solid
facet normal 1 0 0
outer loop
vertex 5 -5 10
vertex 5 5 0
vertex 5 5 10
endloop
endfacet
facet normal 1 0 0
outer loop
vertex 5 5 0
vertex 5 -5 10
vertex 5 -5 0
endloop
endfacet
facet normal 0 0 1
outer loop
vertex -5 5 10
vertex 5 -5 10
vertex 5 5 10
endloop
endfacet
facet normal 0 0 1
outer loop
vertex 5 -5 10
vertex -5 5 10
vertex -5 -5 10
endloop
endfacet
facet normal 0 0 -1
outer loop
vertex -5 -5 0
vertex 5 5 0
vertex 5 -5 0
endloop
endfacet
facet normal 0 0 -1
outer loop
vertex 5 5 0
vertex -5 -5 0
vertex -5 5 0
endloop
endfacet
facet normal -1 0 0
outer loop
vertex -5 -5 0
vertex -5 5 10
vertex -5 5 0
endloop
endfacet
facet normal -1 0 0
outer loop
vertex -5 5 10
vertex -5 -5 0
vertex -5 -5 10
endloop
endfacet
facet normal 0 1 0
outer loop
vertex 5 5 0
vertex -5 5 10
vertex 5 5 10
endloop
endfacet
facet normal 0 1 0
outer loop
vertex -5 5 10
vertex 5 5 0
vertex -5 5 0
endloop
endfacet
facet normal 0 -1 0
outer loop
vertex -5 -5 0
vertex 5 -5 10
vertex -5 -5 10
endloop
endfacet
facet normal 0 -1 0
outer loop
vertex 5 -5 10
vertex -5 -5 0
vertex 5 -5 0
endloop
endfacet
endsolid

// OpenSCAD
translate([0, 0, 5]) color([0,1,0,0.9]) cube([10, 10, 10], center=true);
translate([-1.25, -1.25, 1]) color([1,0,0]) cube([0.5, 0.5, 2], center=true);
translate([-1.25, -0.75, 1]) color([1,0,0]) cube([0.5, 0.5, 2], center=true);
translate([-1.25, -0.25, 1]) color([1,0,0]) cube([0.5, 0.5, 2], center=true);
translate([-1.25, 0.25, 1]) color([1,0,0]) cube([0.5, 0.5, 2], center=true);
translate([-1.25, 0.75, 1]) color([1,0,0]) cube([0.5, 0.5, 2], center=true);
translate([-1.25, 1.25, 1]) color([1,0,0]) cube([0.5, 0.5, 2], center=true);
translate([-0.75, -1.25, 1]) color([1,0,0]) cube([0.5, 0.5, 2], center=true);
translate([-0.75, -0.75, 1]) color([1,0,0]) cube([0.5, 0.5, 2], center=true);
translate([-0.75, -0.25, 1]) color([1,0,0]) cube([0.5, 0.5, 2], center=true);
translate([-0.75, 0.25, 1]) color([1,0,0]) cube([0.5, 0.5, 2], center=true);
translate([-0.75, 0.75, 1]) color([1,0,0]) cube([0.5, 0.5, 2], center=true);
translate([-0.75, 1.25, 1]) color([1,0,0]) cube([0.5, 0.5, 2], center=true);
translate([-0.25, -1.25, 1]) color([1,0,0]) cube([0.5, 0.5, 2], center=true);
translate([-0.25, -0.75, 1]) color([1,0,0]) cube([0.5, 0.5, 2], center=true);
translate([-0.25, -0.25, 1]) color([1,0,0]) cube([0.5, 0.5, 2], center=true);
translate([-0.25, 0.25, 1]) color([1,0,0]) cube([0.5, 0.5, 2], center=true);
translate([-0.25, 0.75, 1]) color([1,0,0]) cube([0.5, 0.5, 2], center=true);
translate([-0.25, 1.25, 1]) color([1,0,0]) cube([0.5, 0.5, 2], center=true);
translate([0.25, -1.25, 1]) color([1,0,0]) cube([0.5, 0.5, 2], center=true);
translate([0.25, -0.75, 1]) color([1,0,0]) cube([0.5, 0.5, 2], center=true);
translate([0.25, -0.25, 1]) color([1,0,0]) cube([0.5, 0.5, 2], center=true);
translate([0.25, 0.25, 1]) color([1,0,0]) cube([0.5, 0.5, 2], center=true);
translate([0.25, 0.75, 1]) color([1,0,0]) cube([0.5, 0.5, 2], center=true);
translate([0.25, 1.25, 1]) color([1,0,0]) cube([0.5, 0.5, 2], center=true);
translate([0.75, -1.25, 1]) color([1,0,0]) cube([0.5, 0.5, 2], center=true);
translate([0.75, -0.75, 1]) color([1,0,0]) cube([0.5, 0.5, 2], center=true);
translate([0.75, -0.25, 1]) color([1,0,0]) cube([0.5, 0.5, 2], center=true);
translate([0.75, 0.25, 1]) color([1,0,0]) cube([0.5, 0.5, 2], center=true);
translate([0.75, 0.75, 1]) color([1,0,0]) cube([0.5, 0.5, 2], center=true);
translate([0.75, 1.25, 1]) color([1,0,0]) cube([0.5, 0.5, 2], center=true);
translate([1.25, -1.25, 1]) color([1,0,0]) cube([0.5, 0.5, 2], center=true);
translate([1.25, -0.75, 1]) color([1,0,0]) cube([0.5, 0.5, 2], center=true);
translate([1.25, -0.25, 1]) color([1,0,0]) cube([0.5, 0.5, 2], center=true);
translate([1.25, 0.25, 1]) color([1,0,0]) cube([0.5, 0.5, 2], center=true);
translate([1.25, 0.75, 1]) color([1,0,0]) cube([0.5, 0.5, 2], center=true);
translate([1.25, 1.25, 1]) color([1,0,0]) cube([0.5, 0.5, 2], center=true);
translate([-1.25, -2.25, 1]) color([1,0,0]) cube([0.5, 0.5, 2], center=true);
translate([-1.25, -1.75, 1]) color([1,0,0]) cube([0.5, 0.5, 2], center=true);
translate([-1.25, -1.25, 1]) color([1,0,0]) cube([0.5, 0.5, 2], center=true);
translate([-1.25, -0.75, 1]) color([1,0,0]) cube([0.5, 0.5, 2], center=true);
translate([-1.25, -0.25, 1]) color([1,0,0]) cube([0.5, 0.5, 2], center=true);
translate([-1.25, 0.25, 1]) color([1,0,0]) cube([0.5, 0.5, 2], center=true);
translate([-1.25, 0.75, 1]) color([1,0,0]) cube([0.5, 0.5, 2], center=true);
translate([-1.25, 1.25, 1]) color([1,0,0]) cube([0.5, 0.5, 2], center=true);
translate([-1.25, 1.75, 1]) color([1,0,0]) cube([0.5, 0.5, 2], center=true);
translate([-1.25, 2.25, 1]) color([1,0,0]) cube([0.5, 0.5, 2], center=true);
translate([-0.75, -2.25, 1]) color([1,0,0]) cube([0.5, 0.5, 2], center=true);
translate([-0.75, -1.75, 1]) color([1,0,0]) cube([0.5, 0.5, 2], center=true);
translate([-0.75, -1.25, 1]) color([1,0,0]) cube([0.5, 0.5, 2], center=true);
translate([-0.75, -0.75, 1]) color([1,0,0]) cube([0.5, 0.5, 2], center=true);
translate([-0.75, -0.25, 1]) color([1,0,0]) cube([0.5, 0.5, 2], center=true);
translate([-0.75, 0.25, 1]) color([1,0,0]) cube([0.5, 0.5, 2], center=true);
translate([-0.75, 0.75, 1]) color([1,0,0]) cube([0.5, 0.5, 2], center=true);
translate([-0.75, 1.25, 1]) color([1,0,0]) cube([0.5, 0.5, 2], center=true);
translate([-0.75, 1.75, 1]) color([1,0,0]) cube([0.5, 0.5, 2], center=true);
translate([-0.75, 2.25, 1]) color([1,0,0]) cube([0.5, 0.5, 2], center=true);
translate([-0.25, -2.25, 1]) color([1,0,0]) cube([0.5, 0.5, 2], center=true);
translate([-0.25, -1.75, 1]) color([1,0,0]) cube([0.5, 0.5, 2], center=true);
translate([-0.25, -1.25, 1]) color([1,0,0]) cube([0.5, 0.5, 2], center=true);
translate([-0.25, -0.75, 1]) color([1,0,0]) cube([0.5, 0.5, 2], center=true);
translate([-0.25, -0.25, 1]) color([1,0,0]) cube([0.5, 0.5, 2], center=true);
translate([-0.25, 0.25, 1]) color([1,0,0]) cube([0.5, 0.5, 2], center=true);
translate([-0.25, 0.75, 1]) color([1,0,0]) cube([0.5, 0.5, 2], center=true);
translate([-0.25, 1.25, 1]) color([1,0,0]) cube([0.5, 0.5, 2], center=true);
translate([-0.25, 1.75, 1]) color([1,0,0]) cube([0.5, 0.5, 2], center=true);
translate([-0.25, 2.25, 1]) color([1,0,0]) cube([0.5, 0.5, 2], center=true);
translate([0.25, -2.25, 1]) color([1,0,0]) cube([0.5, 0.5, 2], center=true);
translate([0.25, -1.75, 1]) color([1,0,0]) cube([0.5, 0.5, 2], center=true);
translate([0.25, -1.25, 1]) color([1,0,0]) cube([0.5, 0.5, 2], center=true);
translate([0.25, -0.75, 1]) color([1,0,0]) cube([0.5, 0.5, 2], center=true);
translate([0.25, -0.25, 1]) color([1,0,0]) cube([0.5, 0.5, 2], center=true);
translate([0.25, 0.25, 1]) color([1,0,0]) cube([0.5, 0.5, 2], center=true);
translate([0.25, 0.75, 1]) color([1,0,0]) cube([0.5, 0.5, 2], center=true);
translate([0.25, 1.25, 1]) color([1,0,0]) cube([0.5, 0.5, 2], center=true);
translate([0.25, 1.75, 1]) color([1,0,0]) cube([0.5, 0.5, 2], center=true);
translate([0.25, 2.25, 1]) color([1,0,0]) cube([0.5, 0.5, 2], center=true);
translate([0.75, -2.25, 1]) color([1,0,0]) cube([0.5, 0.5, 2], center=true);
translate([0.75, -1.75, 1]) color([1,0,0]) cube([0.5, 0.5, 2], center=true);
translate([0.75, -1.25, 1]) color([1,0,0]) cube([0.5, 0.5, 2], center=true);
translate([0.75, -0.75, 1]) color([1,0,0]) cube([0.5, 0.5, 2], center=true);
translate([0.75, -0.25, 1]) color([1,0,0]) cube([0.5, 0.5, 2], center=true);
translate([0.75, 0.25, 1]) color([1,0,0]) cube([0.5, 0.5, 2], center=true);
translate([0.75, 0.75, 1]) color([1,0,0]) cube([0.5, 0.5, 2], center=true);
translate([0.75, 1.25, 1]) color([1,0,0]) cube([0.5, 0.5, 2], center=true);
translate([0.75, 1.75, 1]) color([1,0,0]) cube([0.5, 0.5, 2], center=true);
translate([0.75, 2.25, 1]) color([1,0,0]) cube([0.5, 0.5, 2], center=true);
translate([1.25, -2.25, 1]) color([1,0,0]) cube([0.5, 0.5, 2], center=true);
translate([1.25, -1.75, 1]) color([1,0,0]) cube([0.5, 0.5, 2], center=true);
translate([1.25, -1.25, 1]) color([1,0,0]) cube([0.5, 0.5, 2], center=true);
translate([1.25, -0.75, 1]) color([1,0,0]) cube([0.5, 0.5, 2], center=true);
translate([1.25, -0.25, 1]) color([1,0,0]) cube([0.5, 0.5, 2], center=true);
translate([1.25, 0.25, 1]) color([1,0,0]) cube([0.5, 0.5, 2], center=true);
translate([1.25, 0.75, 1]) color([1,0,0]) cube([0.5, 0.5, 2], center=true);
translate([1.25, 1.25, 1]) color([1,0,0]) cube([0.5, 0.5, 2], center=true);
translate([1.25, 1.75, 1]) color([1,0,0]) cube([0.5, 0.5, 2], center=true);
translate([1.25, 2.25, 1]) color([1,0,0]) cube([0.5, 0.5, 2], center=true);
translate([-2.25, -2.25, 1]) color([1,0,0]) cube([0.5, 0.5, 2], center=true);
translate([-2.25, -1.75, 1]) color([1,0,0]) cube([0.5, 0.5, 2], center=true);
translate([-2.25, -1.25, 1]) color([1,0,0]) cube([0.5, 0.5, 2], center=true);
translate([-2.25, -0.75, 1]) color([1,0,0]) cube([0.5, 0.5, 2], center=true);
translate([-2.25, -0.25, 1]) color([1,0,0]) cube([0.5, 0.5, 2], center=true);
translate([-2.25, 0.25, 1]) color([1,0,0]) cube([0.5, 0.5, 2], center=true);
translate([-2.25, 0.75, 1]) color([1,0,0]) cube([0.5, 0.5, 2], center=true);
translate([-2.25, 1.25, 1]) color([1,0,0]) cube([0.5, 0.5, 2], center=true);
translate([-2.25, 1.75, 1]) color([1,0,0]) cube([0.5, 0.5, 2], center=true);
translate([-2.25, 2.25, 1]) color([1,0,0]) cube([0.5, 0.5, 2], center=true);
translate([-1.75, -2.25, 1]) color([1,0,0]) cube([0.5, 0.5, 2], center=true);
translate([-1.75, -1.75, 1]) color([1,0,0]) cube([0.5, 0.5, 2], center=true);
translate([-1.75, -1.25, 1]) color([1,0,0]) cube([0.5, 0.5, 2], center=true);
translate([-1.75, -0.75, 1]) color([1,0,0]) cube([0.5, 0.5, 2], center=true);
translate([-1.75, -0.25, 1]) color([1,0,0]) cube([0.5, 0.5, 2], center=true);
translate([-1.75, 0.25, 1]) color([1,0,0]) cube([0.5, 0.5, 2], center=true);
translate([-1.75, 0.75, 1]) color([1,0,0]) cube([0.5, 0.5, 2], center=true);
translate([-1.75, 1.25, 1]) color([1,0,0]) cube([0.5, 0.5, 2], center=true);
translate([-1.75, 1.75, 1]) color([1,0,0]) cube([0.5, 0.5, 2], center=true);
translate([-1.75, 2.25, 1]) color([1,0,0]) cube([0.5, 0.5, 2], center=true);
translate([-2.25, -3.25, 1]) color([1,0,0]) cube([0.5, 0.5, 2], center=true);
translate([-2.25, -2.75, 1]) color([1,0,0]) cube([0.5, 0.5, 2], center=true);
translate([-2.25, -2.25, 1]) color([1,0,0]) cube([0.5, 0.5, 2], center=true);
translate([-2.25, -1.75, 1]) color([1,0,0]) cube([0.5, 0.5, 2], center=true);
translate([-2.25, -1.25, 1]) color([1,0,0]) cube([0.5, 0.5, 2], center=true);
translate([-2.25, -0.75, 1]) color([1,0,0]) cube([0.5, 0.5, 2], center=true);
translate([-2.25, -0.25, 1]) color([1,0,0]) cube([0.5, 0.5, 2], center=true);
translate([-2.25, 0.25, 1]) color([1,0,0]) cube([0.5, 0.5, 2], center=true);
translate([-2.25, 0.75, 1]) color([1,0,0]) cube([0.5, 0.5, 2], center=true);
translate([-2.25, 1.25, 1]) color([1,0,0]) cube([0.5, 0.5, 2], center=true);
translate([-2.25, 1.75, 1]) color([1,0,0]) cube([0.5, 0.5, 2], center=true);
translate([-2.25, 2.25, 1]) color([1,0,0]) cube([0.5, 0.5, 2], center=true);
translate([-2.25, 2.75, 1]) color([1,0,0]) cube([0.5, 0.5, 2], center=true);
translate([-2.25, 3.25, 1]) color([1,0,0]) cube([0.5, 0.5, 2], center=true);
translate([-1.75, -3.25, 1]) color([1,0,0]) cube([0.5, 0.5, 2], center=true);
translate([-1.75, -2.75, 1]) color([1,0,0]) cube([0.5, 0.5, 2], center=true);
translate([-1.75, -2.25, 1]) color([1,0,0]) cube([0.5, 0.5, 2], center=true);
translate([-1.75, -1.75, 1]) color([1,0,0]) cube([0.5, 0.5, 2], center=true);
translate([-1.75, -1.25, 1]) color([1,0,0]) cube([0.5, 0.5, 2], center=true);
translate([-1.75, -0.75, 1]) color([1,0,0]) cube([0.5, 0.5, 2], center=true);
translate([-1.75, -0.25, 1]) color([1,0,0]) cube([0.5, 0.5, 2], center=true);
translate([-1.75, 0.25, 1]) color([1,0,0]) cube([0.5, 0.5, 2], center=true);
translate([-1.75, 0.75, 1]) color([1,0,0]) cube([0.5, 0.5, 2], center=true);
translate([-1.75, 1.25, 1]) color([1,0,0]) cube([0.5, 0.5, 2], center=true);
translate([-1.75, 1.75, 1]) color([1,0,0]) cube([0.5, 0.5, 2], center=true);
translate([-1.75, 2.25, 1]) color([1,0,0]) cube([0.5, 0.5, 2], center=true);
translate([-1.75, 2.75, 1]) color([1,0,0]) cube([0.5, 0.5, 2], center=true);
translate([-1.75, 3.25, 1]) color([1,0,0]) cube([0.5, 0.5, 2], center=true);
translate([-3.25, -3.25, 1]) color([1,0,0]) cube([0.5, 0.5, 2], center=true);
translate([-3.25, -2.75, 1]) color([1,0,0]) cube([0.5, 0.5, 2], center=true);
translate([-3.25, -2.25, 1]) color([1,0,0]) cube([0.5, 0.5, 2], center=true);
translate([-3.25, -1.75, 1]) color([1,0,0]) cube([0.5, 0.5, 2], center=true);
translate([-3.25, -1.25, 1]) color([1,0,0]) cube([0.5, 0.5, 2], center=true);
translate([-3.25, -0.75, 1]) color([1,0,0]) cube([0.5, 0.5, 2], center=true);
translate([-3.25, -0.25, 1]) color([1,0,0]) cube([0.5, 0.5, 2], center=true);
translate([-3.25, 0.25, 1]) color([1,0,0]) cube([0.5, 0.5, 2], center=true);
translate([-3.25, 0.75, 1]) color([1,0,0]) cube([0.5, 0.5, 2], center=true);
translate([-3.25, 1.25, 1]) color([1,0,0]) cube([0.5, 0.5, 2], center=true);
translate([-3.25, 1.75, 1]) color([1,0,0]) cube([0.5, 0.5, 2], center=true);
translate([-3.25, 2.25, 1]) color([1,0,0]) cube([0.5, 0.5, 2], center=true);
translate([-3.25, 2.75, 1]) color([1,0,0]) cube([0.5, 0.5, 2], center=true);
translate([-3.25, 3.25, 1]) color([1,0,0]) cube([0.5, 0.5, 2], center=true);
translate([-2.75, -3.25, 1]) color([1,0,0]) cube([0.5, 0.5, 2], center=true);
translate([-2.75, -2.75, 1]) color([1,0,0]) cube([0.5, 0.5, 2], center=true);
translate([-2.75, -2.25, 1]) color([1,0,0]) cube([0.5, 0.5, 2], center=true);
translate([-2.75, -1.75, 1]) color([1,0,0]) cube([0.5, 0.5, 2], center=true);
translate([-2.75, -1.25, 1]) color([1,0,0]) cube([0.5, 0.5, 2], center=true);
translate([-2.75, -0.75, 1]) color([1,0,0]) cube([0.5, 0.5, 2], center=true);
translate([-2.75, -0.25, 1]) color([1,0,0]) cube([0.5, 0.5, 2], center=true);
translate([-2.75, 0.25, 1]) color([1,0,0]) cube([0.5, 0.5, 2], center=true);
translate([-2.75, 0.75, 1]) color([1,0,0]) cube([0.5, 0.5, 2], center=true);
translate([-2.75, 1.25, 1]) color([1,0,0]) cube([0.5, 0.5, 2], center=true);
translate([-2.75, 1.75, 1]) color([1,0,0]) cube([0.5, 0.5, 2], center=true);
translate([-2.75, 2.25, 1]) color([1,0,0]) cube([0.5, 0.5, 2], center=true);
translate([-2.75, 2.75, 1]) color([1,0,0]) cube([0.5, 0.5, 2], center=true);
translate([-2.75, 3.25, 1]) color([1,0,0]) cube([0.5, 0.5, 2], center=true);
